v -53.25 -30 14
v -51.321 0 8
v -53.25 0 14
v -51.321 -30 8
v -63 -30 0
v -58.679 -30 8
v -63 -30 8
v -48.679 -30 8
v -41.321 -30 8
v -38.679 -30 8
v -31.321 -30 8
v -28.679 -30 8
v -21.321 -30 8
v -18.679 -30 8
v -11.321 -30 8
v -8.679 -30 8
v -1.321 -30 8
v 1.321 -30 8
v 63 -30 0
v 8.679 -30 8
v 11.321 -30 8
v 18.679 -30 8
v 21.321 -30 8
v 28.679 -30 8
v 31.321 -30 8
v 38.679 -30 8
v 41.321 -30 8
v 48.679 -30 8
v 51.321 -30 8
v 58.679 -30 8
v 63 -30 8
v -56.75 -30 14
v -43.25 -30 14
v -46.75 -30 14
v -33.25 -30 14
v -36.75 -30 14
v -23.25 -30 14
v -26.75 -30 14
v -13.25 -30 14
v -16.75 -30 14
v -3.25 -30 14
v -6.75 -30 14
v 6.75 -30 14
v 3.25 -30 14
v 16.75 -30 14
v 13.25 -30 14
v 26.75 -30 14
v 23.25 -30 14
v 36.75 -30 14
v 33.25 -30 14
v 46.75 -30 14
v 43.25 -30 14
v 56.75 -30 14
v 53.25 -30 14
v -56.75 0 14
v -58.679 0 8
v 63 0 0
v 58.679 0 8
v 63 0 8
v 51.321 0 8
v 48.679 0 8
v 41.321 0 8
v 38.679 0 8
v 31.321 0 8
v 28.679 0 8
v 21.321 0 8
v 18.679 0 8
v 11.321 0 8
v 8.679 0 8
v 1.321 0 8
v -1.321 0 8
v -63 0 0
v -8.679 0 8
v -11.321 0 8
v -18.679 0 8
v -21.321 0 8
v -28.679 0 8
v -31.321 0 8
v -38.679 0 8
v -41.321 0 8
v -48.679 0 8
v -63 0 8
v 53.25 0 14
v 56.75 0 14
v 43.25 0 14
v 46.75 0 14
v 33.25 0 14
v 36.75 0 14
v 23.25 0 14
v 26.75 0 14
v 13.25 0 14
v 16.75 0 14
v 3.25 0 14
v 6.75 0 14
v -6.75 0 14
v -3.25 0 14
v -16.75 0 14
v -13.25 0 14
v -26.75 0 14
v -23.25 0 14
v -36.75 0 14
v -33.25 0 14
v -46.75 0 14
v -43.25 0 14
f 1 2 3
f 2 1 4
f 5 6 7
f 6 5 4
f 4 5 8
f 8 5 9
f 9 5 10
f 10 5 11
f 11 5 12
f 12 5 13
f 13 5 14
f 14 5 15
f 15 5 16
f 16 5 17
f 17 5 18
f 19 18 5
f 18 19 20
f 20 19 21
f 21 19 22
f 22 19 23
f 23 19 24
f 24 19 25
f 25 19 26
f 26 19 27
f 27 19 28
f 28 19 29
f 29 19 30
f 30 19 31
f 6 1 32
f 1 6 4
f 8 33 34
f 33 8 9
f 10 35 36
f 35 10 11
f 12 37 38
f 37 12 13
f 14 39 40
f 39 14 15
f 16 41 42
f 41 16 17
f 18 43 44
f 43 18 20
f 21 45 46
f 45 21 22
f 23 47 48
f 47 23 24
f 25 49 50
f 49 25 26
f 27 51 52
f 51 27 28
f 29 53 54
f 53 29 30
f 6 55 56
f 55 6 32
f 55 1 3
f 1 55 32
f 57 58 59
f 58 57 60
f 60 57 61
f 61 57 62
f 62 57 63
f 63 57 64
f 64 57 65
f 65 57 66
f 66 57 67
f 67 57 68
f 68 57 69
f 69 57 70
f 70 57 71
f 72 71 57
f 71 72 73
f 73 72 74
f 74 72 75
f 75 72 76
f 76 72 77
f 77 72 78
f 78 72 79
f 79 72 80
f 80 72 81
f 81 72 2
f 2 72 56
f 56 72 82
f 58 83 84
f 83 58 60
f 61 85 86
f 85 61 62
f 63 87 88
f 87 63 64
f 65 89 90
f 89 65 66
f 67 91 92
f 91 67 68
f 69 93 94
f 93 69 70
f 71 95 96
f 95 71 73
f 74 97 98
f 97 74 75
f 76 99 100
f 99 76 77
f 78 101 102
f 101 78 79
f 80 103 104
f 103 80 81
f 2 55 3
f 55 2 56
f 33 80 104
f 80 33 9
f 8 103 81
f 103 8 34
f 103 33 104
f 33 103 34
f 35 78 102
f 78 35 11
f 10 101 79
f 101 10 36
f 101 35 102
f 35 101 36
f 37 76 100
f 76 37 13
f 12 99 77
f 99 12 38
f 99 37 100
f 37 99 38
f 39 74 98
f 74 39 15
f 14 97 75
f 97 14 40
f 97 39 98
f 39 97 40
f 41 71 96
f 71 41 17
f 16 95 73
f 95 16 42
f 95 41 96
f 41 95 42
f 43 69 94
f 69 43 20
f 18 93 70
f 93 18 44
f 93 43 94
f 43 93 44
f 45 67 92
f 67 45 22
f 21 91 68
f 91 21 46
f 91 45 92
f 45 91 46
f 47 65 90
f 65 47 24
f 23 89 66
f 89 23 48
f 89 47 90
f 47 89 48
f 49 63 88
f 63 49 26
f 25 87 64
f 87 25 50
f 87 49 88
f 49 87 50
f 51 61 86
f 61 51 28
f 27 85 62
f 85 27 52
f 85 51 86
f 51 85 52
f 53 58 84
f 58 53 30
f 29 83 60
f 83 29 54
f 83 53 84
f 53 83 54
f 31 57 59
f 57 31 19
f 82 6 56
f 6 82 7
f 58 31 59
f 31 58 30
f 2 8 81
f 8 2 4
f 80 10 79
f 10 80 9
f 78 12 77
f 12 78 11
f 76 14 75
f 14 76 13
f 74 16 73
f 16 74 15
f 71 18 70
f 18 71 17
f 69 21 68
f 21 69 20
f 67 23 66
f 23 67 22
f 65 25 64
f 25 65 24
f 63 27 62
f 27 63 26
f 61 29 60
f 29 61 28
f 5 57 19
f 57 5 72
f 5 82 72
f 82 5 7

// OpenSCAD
$fn = 32;

// ----------------------------------------------------------------------
// Toothed rack, 12 teeth
// 10 mm pitch, 6 mm teeth
// ----------------------------------------------------------------------

// --- parameters (mm) ---
bar_w = 30;     // bar width (Y)
bar_h = 8;      // bar height (Z)
teeth = 12;     // number of teeth
pitch = 10;     // tooth pitch
tooth_h = 6;    // tooth height above the bar
root_w = 8;     // tooth width at the root
crest_w = 3.5;  // tooth width at the crest

// --- derived feature positions (mm) ---
span = (teeth - 1) * pitch;  // = 110   distance between the outer teeth
bar_l = span + root_w + 8;   // = 126   bar length: teeth plus 4 mm at each end
tooth_x = -span / 2;         // = -55   X of the first tooth
height = bar_h + tooth_h;    // = 14   overall height
feature_centers = [
  [tooth_x + 0 * pitch, -bar_w / 2],
  [tooth_x + 1 * pitch, -bar_w / 2],
  [tooth_x + 2 * pitch, -bar_w / 2],
  [tooth_x + 3 * pitch, -bar_w / 2],
  [tooth_x + 4 * pitch, -bar_w / 2],
  [tooth_x + 5 * pitch, -bar_w / 2],
  [tooth_x + 6 * pitch, -bar_w / 2],
  [tooth_x + 7 * pitch, -bar_w / 2],
  [tooth_x + 8 * pitch, -bar_w / 2],
  [tooth_x + 9 * pitch, -bar_w / 2],
  [tooth_x + 10 * pitch, -bar_w / 2],
  [tooth_x + 11 * pitch, -bar_w / 2]
];   // tooth centre line, drives the tooth loop

// bar with a rack of teeth, one extruded trapezoium per centre
module rack_tooth() {
  linear_extrude(height = bar_w)
    polygon(points = [
      [0, 0],
      [root_w, 0],
      [root_w / 2 + crest_w / 2, tooth_h + 1],
      [root_w / 2 - crest_w / 2, tooth_h + 1]
    ]);
}

union() {
  translate([-bar_l / 2, -bar_w, 0]) cube([bar_l, bar_w, bar_h]);
  for (centre = feature_centers)
    translate([centre[0] - root_w / 2, 0, bar_h - 1]) rotate([90, 0, 0]) rack_tooth();
}
